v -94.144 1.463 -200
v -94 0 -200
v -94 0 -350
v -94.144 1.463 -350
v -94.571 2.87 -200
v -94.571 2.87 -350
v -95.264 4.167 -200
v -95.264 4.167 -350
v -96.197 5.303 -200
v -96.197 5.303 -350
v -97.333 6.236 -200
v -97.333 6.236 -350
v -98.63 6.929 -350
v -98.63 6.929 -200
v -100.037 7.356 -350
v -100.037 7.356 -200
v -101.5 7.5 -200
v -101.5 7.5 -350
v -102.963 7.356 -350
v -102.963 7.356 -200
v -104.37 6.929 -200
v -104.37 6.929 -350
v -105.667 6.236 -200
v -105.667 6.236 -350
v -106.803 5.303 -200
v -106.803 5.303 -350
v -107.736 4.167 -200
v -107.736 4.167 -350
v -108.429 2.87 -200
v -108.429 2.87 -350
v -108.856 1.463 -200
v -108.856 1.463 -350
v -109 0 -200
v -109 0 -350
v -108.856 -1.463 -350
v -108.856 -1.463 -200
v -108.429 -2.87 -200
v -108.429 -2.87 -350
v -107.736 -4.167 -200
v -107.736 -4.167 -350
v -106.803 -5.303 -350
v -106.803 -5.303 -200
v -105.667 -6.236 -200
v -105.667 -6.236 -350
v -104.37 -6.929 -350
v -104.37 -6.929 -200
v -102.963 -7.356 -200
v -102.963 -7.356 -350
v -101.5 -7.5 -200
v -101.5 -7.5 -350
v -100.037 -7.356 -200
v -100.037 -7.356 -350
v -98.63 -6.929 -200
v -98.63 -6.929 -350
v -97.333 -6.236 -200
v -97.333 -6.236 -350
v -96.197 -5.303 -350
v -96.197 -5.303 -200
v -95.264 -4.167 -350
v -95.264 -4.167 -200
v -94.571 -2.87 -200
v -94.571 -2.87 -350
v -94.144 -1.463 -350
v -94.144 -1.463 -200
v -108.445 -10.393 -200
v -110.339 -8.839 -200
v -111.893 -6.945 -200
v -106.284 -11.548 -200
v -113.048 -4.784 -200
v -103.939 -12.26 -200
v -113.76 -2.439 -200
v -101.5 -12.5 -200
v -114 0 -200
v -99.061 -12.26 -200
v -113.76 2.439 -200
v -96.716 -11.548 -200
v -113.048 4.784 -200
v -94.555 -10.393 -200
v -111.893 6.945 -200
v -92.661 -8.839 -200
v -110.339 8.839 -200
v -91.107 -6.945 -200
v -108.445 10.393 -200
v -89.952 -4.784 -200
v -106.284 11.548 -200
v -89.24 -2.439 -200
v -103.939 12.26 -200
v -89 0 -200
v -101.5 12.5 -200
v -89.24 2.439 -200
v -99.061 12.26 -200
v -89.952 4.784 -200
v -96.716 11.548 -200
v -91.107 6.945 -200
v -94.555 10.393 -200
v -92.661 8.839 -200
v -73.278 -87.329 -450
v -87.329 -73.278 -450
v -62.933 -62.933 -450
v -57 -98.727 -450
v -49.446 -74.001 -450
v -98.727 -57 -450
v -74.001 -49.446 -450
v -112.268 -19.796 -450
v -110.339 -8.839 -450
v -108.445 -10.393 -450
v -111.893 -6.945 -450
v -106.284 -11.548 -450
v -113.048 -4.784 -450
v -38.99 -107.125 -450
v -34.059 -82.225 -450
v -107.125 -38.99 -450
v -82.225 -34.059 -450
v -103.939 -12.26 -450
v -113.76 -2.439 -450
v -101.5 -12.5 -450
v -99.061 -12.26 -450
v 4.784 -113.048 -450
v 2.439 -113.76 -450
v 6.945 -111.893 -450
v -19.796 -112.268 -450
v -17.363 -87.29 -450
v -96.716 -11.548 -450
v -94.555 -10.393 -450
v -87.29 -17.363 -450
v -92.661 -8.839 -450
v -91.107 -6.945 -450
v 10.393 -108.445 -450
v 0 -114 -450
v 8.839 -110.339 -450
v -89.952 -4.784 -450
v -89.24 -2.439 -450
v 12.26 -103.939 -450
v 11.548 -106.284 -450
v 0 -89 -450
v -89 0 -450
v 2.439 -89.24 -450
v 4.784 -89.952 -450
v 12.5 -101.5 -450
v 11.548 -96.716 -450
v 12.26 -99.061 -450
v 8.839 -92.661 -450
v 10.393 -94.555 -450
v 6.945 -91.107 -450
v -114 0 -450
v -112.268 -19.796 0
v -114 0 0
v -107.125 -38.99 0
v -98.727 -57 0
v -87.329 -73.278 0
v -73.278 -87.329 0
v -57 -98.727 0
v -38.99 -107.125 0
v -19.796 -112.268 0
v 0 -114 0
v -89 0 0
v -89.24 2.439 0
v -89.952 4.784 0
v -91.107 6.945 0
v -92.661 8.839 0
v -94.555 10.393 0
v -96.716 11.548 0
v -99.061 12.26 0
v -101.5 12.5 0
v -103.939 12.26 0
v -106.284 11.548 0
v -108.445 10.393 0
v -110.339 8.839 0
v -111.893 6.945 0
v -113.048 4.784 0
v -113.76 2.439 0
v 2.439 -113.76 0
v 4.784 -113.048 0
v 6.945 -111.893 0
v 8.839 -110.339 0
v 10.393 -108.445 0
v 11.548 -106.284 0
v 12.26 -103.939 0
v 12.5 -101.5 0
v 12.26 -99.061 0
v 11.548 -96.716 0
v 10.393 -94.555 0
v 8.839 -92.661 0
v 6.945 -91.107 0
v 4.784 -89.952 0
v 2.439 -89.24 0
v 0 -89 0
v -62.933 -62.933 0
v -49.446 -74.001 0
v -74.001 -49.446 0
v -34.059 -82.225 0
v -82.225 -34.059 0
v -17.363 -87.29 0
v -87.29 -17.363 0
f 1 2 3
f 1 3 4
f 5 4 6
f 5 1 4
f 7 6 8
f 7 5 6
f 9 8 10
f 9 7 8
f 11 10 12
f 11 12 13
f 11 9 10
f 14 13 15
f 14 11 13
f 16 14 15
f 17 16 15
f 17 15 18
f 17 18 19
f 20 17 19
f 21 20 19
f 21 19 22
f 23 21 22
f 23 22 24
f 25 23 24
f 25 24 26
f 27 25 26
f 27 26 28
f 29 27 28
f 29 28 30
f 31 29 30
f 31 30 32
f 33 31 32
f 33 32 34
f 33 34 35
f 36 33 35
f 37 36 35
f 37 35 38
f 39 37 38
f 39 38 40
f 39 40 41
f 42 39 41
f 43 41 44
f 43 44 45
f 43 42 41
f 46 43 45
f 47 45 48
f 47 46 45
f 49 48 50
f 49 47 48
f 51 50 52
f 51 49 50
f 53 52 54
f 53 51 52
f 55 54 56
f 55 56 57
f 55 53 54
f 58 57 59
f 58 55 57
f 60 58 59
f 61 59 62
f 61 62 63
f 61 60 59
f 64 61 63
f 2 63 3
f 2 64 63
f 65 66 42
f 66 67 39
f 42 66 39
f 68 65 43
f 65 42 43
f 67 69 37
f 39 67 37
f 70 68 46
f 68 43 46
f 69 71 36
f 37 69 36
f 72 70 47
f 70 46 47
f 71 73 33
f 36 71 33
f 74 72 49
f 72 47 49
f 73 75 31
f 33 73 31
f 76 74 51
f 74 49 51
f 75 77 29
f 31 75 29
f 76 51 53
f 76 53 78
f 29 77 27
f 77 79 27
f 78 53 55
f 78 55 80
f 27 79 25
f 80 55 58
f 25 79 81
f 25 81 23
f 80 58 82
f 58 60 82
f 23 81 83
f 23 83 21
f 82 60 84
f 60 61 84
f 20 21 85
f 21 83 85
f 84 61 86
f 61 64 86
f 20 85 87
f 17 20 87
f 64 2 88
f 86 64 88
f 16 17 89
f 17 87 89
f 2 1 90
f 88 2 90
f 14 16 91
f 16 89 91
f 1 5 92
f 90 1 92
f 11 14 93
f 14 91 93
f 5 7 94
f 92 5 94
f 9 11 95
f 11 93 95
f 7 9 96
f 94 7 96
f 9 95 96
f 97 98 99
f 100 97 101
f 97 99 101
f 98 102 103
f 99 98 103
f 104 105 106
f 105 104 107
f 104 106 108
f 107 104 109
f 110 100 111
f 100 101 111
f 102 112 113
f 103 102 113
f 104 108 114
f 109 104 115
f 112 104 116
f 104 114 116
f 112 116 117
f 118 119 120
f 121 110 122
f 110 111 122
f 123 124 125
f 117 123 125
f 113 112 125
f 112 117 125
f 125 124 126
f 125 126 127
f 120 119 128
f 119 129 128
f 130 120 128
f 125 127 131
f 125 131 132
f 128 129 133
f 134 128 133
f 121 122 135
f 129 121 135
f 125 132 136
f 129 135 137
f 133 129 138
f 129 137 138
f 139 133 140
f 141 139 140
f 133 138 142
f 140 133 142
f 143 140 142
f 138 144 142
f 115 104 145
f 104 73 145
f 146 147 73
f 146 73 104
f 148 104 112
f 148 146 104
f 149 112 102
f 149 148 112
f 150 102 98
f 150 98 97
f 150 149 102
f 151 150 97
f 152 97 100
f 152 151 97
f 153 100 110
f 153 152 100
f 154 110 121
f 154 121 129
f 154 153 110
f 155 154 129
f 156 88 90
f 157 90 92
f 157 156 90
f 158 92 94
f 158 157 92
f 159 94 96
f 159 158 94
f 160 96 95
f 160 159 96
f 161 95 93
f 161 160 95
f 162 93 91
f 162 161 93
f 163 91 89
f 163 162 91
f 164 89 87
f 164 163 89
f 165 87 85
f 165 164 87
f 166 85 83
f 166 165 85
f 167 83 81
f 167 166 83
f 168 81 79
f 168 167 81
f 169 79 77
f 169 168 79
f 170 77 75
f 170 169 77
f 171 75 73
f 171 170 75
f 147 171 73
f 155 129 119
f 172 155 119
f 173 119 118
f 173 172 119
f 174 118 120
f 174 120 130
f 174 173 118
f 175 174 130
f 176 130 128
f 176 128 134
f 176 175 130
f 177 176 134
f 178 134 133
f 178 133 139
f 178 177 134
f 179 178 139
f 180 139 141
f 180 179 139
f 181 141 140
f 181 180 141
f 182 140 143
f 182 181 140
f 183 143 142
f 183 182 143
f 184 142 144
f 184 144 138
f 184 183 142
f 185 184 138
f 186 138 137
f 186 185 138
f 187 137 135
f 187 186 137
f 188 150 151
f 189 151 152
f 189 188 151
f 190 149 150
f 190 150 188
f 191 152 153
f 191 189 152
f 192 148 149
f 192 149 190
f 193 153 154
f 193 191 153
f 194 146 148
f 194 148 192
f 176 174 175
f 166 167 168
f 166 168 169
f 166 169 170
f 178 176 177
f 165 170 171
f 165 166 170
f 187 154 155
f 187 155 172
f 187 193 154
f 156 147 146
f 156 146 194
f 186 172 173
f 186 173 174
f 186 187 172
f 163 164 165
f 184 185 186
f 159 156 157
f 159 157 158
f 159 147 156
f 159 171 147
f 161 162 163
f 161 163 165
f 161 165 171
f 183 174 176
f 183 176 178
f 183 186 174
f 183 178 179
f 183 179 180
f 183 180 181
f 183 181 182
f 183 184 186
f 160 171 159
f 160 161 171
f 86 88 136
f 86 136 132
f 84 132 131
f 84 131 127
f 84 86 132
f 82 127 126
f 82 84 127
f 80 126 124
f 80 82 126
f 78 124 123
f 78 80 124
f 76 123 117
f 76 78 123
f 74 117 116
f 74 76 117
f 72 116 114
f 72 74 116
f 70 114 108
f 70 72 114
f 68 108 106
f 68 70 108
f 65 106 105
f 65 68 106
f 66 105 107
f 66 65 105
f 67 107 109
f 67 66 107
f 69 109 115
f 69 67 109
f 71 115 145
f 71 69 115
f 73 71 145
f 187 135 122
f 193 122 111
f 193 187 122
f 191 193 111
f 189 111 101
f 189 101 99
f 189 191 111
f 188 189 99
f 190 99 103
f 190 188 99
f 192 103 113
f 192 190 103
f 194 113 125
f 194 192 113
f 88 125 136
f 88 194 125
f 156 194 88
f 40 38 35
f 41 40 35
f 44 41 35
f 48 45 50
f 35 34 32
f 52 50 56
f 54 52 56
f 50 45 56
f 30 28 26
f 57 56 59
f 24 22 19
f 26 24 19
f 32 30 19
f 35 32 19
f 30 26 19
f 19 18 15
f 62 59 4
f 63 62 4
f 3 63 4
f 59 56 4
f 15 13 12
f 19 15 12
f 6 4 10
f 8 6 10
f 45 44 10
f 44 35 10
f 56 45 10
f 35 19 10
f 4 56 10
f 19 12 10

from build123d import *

# Parameters (mm, degrees)
BOSS_EXTRU_1_DEPTH = 450
ESQUISSE1_3_R      = 7.5
BOSS_EXTRU_2_DEPTH = 350
ESQUISSE1_4_R      = 7.5
BOSS_EXTRU_3_DEPTH = 200


with BuildPart() as part:
    # Esquisse1 → Boss.-Extru.1 (new body)
    with BuildSketch(Plane.XY):
        with BuildLine():
            ThreePointArc((-6e-09, -89), (-62.932503528, -62.932503523), (-89, 0))
            ThreePointArc((-89, 0), (-101.500000043, -12.5), (-114, 8.5e-08))
            ThreePointArc((-114, 8.5e-08), (-80.610173059, -80.610173051), (7.4e-08, -114))
            ThreePointArc((7.4e-08, -114), (12.5, -101.49999996), (-6e-09, -89))
        make_face()
    extrude(amount=-BOSS_EXTRU_1_DEPTH)



with BuildPart() as body_2:
    # Esquisse1<3> → Boss.-Extru.2 (new body)
    with BuildSketch(Plane.XY):
        with Locations((-101.5, 0)):
            Circle(ESQUISSE1_3_R)
    extrude(amount=-BOSS_EXTRU_2_DEPTH)


with BuildPart() as part_1:
    add(part.part)

    add(body_2.part)  # Boss.-Extru.3 merges body 2
    # Esquisse1<4> → Boss.-Extru.3 (add)
    with BuildSketch(Plane.XY):
        with BuildLine():
            ThreePointArc((-114, 8.5e-08), (-101.500000043, -12.5), (-89, 0))
            ThreePointArc((-89, 0), (-101.499999957, 12.5), (-114, 8.5e-08))
        make_face()
        with Locations((-101.5, 0)):
            Circle(ESQUISSE1_4_R, mode=Mode.SUBTRACT)
    extrude(amount=-BOSS_EXTRU_3_DEPTH)


solid = part_1.part
